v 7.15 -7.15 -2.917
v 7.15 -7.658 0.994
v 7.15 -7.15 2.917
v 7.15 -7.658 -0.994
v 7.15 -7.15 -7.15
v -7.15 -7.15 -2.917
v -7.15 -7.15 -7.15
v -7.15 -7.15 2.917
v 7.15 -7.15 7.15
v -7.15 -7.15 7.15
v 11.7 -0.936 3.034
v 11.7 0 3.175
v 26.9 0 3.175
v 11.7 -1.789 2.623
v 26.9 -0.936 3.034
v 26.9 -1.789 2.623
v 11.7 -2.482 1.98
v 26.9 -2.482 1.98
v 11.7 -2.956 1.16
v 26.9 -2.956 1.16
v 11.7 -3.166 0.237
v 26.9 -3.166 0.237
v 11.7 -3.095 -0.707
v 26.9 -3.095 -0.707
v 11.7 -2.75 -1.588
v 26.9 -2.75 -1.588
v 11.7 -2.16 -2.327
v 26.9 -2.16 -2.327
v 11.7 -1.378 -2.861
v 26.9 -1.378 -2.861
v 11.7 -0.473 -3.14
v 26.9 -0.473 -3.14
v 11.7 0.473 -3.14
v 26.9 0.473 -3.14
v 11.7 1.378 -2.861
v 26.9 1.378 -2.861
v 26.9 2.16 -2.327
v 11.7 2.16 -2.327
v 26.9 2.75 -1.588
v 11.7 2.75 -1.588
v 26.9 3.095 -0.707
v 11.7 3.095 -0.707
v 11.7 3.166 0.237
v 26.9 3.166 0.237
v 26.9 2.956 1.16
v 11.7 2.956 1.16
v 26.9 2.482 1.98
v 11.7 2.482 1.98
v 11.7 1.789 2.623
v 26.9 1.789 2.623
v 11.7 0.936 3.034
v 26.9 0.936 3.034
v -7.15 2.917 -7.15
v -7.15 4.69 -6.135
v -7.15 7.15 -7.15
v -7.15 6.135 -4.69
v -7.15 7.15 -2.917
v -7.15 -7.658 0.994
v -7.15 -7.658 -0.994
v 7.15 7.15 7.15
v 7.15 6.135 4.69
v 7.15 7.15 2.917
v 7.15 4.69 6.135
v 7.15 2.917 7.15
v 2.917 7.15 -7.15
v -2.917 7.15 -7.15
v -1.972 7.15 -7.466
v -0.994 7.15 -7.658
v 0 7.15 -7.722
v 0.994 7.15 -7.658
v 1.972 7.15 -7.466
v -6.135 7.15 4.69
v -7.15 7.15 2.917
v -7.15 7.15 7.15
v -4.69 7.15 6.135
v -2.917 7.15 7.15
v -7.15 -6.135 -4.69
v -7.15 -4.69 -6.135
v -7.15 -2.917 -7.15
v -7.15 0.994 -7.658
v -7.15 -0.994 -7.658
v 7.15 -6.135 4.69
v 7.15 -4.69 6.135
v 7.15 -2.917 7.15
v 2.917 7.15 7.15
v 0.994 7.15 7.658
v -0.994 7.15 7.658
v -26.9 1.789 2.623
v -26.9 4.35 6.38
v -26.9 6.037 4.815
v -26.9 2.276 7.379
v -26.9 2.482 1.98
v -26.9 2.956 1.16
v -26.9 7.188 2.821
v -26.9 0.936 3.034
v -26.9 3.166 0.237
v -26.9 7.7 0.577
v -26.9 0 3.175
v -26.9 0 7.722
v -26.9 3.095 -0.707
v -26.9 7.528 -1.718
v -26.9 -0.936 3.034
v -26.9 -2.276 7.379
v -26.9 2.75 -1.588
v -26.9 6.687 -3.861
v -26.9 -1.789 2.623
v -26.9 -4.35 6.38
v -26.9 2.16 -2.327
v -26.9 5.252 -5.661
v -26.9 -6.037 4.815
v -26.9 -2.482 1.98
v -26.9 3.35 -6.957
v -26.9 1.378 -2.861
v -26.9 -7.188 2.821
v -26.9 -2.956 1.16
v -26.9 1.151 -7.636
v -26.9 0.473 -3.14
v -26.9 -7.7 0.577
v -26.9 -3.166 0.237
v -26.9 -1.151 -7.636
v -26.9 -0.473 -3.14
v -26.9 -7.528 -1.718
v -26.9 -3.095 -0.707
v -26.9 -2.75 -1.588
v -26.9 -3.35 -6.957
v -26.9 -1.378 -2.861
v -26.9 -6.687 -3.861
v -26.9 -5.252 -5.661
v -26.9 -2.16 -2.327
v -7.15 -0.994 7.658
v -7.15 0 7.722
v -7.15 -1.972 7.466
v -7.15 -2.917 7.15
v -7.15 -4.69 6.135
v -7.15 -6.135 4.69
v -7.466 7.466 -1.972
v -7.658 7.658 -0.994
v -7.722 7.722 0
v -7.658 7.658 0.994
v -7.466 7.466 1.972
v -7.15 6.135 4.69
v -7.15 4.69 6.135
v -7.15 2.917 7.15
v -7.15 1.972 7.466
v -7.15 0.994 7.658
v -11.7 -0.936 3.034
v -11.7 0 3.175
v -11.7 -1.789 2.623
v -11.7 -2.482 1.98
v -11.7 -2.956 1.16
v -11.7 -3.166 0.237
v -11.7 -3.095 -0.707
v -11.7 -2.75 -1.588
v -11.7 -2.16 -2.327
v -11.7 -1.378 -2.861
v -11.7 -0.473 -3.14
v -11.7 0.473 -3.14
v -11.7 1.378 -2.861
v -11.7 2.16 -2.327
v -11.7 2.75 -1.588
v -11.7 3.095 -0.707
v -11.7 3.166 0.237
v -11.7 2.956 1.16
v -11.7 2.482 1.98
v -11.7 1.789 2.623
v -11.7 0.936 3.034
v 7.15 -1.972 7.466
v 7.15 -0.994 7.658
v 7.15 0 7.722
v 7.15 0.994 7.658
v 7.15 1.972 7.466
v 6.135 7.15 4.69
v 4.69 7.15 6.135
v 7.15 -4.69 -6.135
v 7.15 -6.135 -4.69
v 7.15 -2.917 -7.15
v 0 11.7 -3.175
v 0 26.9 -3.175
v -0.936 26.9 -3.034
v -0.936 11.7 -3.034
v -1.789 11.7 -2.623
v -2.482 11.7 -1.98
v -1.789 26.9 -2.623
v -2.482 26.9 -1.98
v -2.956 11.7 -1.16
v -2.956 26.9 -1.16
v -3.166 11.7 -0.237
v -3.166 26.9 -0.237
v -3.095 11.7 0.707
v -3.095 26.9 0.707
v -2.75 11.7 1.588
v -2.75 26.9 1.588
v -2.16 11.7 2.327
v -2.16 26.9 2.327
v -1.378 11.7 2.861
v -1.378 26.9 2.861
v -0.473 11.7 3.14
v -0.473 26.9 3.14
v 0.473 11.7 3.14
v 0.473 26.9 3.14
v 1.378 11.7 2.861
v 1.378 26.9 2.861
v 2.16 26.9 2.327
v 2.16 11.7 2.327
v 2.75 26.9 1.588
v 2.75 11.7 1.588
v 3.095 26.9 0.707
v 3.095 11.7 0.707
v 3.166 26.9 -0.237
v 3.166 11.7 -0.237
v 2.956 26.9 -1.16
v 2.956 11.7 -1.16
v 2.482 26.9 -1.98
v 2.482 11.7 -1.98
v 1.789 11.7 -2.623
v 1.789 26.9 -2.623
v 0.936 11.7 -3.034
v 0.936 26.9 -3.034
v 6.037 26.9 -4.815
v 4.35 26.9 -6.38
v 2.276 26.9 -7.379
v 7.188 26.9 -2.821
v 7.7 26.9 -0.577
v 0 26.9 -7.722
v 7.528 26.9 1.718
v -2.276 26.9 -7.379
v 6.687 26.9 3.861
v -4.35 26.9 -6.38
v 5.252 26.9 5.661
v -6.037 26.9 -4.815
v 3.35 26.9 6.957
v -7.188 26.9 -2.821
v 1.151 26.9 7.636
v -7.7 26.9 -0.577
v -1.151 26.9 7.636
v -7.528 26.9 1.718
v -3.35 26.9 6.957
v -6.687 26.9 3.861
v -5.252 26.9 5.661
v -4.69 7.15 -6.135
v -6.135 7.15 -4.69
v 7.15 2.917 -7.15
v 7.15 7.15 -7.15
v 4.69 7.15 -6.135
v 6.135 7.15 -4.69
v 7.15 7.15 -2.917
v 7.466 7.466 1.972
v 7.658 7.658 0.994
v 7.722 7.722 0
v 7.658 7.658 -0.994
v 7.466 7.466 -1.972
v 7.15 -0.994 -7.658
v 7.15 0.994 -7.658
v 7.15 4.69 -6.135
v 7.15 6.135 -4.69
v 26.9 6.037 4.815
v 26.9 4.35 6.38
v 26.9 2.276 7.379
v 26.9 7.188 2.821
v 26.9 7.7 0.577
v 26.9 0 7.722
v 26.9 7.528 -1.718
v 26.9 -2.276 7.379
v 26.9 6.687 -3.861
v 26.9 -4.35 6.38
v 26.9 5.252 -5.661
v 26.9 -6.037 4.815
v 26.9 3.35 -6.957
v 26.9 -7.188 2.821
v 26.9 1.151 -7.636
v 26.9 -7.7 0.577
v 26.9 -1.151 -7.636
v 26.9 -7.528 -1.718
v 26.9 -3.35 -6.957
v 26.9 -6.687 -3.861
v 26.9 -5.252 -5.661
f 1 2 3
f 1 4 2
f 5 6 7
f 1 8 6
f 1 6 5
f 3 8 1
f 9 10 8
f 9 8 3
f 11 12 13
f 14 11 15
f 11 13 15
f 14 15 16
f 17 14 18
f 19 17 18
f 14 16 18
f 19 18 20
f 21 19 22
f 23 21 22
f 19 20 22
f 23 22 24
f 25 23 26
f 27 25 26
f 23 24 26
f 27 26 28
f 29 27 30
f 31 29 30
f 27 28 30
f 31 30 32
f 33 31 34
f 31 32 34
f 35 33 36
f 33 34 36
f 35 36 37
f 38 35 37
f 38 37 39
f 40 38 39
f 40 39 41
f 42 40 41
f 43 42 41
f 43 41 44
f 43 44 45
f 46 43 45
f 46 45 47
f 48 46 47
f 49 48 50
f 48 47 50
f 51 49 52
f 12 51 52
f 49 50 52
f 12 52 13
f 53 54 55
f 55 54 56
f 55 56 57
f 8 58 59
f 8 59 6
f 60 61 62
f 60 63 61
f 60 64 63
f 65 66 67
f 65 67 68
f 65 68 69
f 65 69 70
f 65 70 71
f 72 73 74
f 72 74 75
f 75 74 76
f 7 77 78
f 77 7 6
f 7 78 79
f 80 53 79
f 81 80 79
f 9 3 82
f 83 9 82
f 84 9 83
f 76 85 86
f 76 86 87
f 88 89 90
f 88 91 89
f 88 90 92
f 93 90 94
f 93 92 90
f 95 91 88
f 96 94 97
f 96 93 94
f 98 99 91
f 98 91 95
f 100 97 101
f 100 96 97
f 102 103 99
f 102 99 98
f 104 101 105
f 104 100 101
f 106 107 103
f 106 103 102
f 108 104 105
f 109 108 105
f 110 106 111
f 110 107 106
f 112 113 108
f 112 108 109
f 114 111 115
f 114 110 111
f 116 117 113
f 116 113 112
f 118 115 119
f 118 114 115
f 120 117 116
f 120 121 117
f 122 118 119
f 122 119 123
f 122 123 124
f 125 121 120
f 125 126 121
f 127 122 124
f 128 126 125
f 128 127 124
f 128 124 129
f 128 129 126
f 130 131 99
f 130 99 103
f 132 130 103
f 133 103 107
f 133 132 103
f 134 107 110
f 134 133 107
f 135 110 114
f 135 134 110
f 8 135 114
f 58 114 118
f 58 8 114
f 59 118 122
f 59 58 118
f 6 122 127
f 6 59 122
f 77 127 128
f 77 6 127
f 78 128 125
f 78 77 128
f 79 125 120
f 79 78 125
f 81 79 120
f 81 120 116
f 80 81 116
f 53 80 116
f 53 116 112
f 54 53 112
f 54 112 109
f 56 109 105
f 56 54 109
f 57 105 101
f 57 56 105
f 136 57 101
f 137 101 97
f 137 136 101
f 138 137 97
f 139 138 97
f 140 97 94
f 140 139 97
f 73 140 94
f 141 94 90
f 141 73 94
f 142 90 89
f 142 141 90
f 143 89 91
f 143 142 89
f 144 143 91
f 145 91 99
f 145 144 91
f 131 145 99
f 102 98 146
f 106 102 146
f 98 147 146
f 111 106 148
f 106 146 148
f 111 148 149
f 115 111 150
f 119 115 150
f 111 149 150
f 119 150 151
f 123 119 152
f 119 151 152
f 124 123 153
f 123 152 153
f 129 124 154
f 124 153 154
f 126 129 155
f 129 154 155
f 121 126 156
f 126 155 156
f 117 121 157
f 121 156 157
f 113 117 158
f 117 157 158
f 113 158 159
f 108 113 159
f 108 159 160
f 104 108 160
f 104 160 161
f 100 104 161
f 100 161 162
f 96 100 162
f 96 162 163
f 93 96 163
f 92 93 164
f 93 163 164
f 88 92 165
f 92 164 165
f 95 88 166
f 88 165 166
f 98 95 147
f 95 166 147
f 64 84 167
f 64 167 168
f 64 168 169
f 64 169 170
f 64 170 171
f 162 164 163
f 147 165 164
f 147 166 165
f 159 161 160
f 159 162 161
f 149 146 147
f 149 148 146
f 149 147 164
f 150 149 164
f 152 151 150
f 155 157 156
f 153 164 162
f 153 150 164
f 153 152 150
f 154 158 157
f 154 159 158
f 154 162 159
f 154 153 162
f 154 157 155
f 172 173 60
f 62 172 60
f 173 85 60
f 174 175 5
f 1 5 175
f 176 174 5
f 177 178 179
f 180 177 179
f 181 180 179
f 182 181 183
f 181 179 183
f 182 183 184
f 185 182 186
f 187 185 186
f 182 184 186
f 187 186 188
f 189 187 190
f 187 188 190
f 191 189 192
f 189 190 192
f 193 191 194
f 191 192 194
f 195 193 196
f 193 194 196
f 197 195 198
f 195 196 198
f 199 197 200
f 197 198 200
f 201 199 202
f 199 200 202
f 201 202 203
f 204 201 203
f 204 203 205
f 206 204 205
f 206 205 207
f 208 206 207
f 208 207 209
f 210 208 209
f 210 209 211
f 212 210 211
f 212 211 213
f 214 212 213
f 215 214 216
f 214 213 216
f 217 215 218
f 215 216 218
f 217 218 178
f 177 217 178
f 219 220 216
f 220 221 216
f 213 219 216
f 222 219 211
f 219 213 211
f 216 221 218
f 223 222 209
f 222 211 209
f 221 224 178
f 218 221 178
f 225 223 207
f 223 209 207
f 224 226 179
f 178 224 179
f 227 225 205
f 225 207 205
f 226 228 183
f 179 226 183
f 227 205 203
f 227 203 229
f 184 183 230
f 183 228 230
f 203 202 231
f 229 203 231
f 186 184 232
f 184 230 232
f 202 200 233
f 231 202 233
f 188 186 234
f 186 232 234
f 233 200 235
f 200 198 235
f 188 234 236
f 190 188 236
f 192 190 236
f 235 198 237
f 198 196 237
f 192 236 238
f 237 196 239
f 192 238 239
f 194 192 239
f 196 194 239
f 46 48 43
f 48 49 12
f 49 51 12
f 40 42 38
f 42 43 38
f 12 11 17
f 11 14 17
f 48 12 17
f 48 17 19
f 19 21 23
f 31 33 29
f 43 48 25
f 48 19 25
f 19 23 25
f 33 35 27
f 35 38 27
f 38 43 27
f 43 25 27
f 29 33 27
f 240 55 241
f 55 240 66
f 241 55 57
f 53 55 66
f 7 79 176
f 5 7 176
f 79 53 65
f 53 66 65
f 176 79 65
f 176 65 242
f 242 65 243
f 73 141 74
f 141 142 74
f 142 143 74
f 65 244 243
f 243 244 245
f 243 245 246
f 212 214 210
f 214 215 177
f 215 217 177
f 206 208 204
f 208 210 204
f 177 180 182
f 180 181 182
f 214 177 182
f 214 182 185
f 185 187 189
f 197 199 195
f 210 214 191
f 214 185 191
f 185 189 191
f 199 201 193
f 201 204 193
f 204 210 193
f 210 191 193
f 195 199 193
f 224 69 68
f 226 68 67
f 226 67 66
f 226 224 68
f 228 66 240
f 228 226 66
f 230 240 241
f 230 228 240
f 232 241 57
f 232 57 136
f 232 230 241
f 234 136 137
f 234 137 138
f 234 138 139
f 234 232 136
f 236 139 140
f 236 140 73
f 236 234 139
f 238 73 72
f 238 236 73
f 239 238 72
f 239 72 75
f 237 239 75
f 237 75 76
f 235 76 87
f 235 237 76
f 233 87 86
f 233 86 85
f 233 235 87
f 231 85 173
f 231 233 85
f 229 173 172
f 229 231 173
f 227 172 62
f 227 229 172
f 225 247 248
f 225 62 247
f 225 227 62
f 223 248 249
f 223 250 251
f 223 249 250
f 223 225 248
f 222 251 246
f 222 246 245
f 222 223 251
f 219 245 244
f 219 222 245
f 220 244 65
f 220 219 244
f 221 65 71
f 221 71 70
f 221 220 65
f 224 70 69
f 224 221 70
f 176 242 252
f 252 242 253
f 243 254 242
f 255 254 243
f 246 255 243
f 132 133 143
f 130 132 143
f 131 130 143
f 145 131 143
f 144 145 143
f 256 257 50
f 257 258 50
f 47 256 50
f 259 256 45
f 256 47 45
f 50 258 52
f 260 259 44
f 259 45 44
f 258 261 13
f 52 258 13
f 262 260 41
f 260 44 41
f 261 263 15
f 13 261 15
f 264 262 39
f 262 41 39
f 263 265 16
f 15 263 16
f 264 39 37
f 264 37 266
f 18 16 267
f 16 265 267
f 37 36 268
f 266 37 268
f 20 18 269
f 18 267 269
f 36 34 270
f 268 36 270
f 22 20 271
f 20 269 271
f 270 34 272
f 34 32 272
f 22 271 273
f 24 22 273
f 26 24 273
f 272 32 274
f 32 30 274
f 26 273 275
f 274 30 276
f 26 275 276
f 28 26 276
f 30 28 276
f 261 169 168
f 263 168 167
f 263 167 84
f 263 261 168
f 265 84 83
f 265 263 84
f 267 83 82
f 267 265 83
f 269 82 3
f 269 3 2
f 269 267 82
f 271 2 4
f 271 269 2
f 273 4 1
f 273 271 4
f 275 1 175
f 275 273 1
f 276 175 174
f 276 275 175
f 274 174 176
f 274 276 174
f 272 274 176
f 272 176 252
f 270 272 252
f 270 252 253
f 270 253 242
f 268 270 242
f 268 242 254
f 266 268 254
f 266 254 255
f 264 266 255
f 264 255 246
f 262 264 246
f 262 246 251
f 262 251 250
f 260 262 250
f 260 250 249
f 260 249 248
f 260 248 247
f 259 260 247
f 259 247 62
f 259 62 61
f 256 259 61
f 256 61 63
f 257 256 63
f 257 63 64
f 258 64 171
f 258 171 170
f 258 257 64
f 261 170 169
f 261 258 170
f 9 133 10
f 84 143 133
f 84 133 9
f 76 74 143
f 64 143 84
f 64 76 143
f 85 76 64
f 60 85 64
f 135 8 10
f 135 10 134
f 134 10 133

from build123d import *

# Parameters (mm, degrees)
BLOCK_SKETCH_W      = 14.3
BLOCK_SKETCH_H      = 14.3
BLOCK_DEPTH         = 7.15
ARM_X_SKETCH_W      = 19.75
ARM_X_SKETCH_H      = 7.722
ARM_Y_SKETCH_W      = 7.722
ARM_Y_SKETCH_H      = 19.75
SOCKET_X_SKETCH_W   = 16.2
SOCKET_X_SKETCH_H   = 3.175
SOCKET_Y_SKETCH_W   = 3.175
SOCKET_Y_SKETCH_H   = 16.2
ARM_X_SKETCH_2_W    = 19.75
ARM_X_SKETCH_2_H    = 7.722
SOCKET_X_SKETCH_2_W = 16.2
SOCKET_X_SKETCH_2_H = 3.175


with BuildPart() as part:
    # Block Sketch → Block (new, symmetric)
    with BuildSketch(Plane.XY):
        Rectangle(BLOCK_SKETCH_W, BLOCK_SKETCH_H)
    extrude(amount=BLOCK_DEPTH, both=True)

    # Arm X Sketch → Arm X (revolve)
    with BuildSketch(Plane.XY):
        with Locations((17.025, 3.861)):
            Rectangle(ARM_X_SKETCH_W, ARM_X_SKETCH_H)
    revolve(axis=Axis((-1000, 0, 0), (1, 0, 0)))

    # Arm Y Sketch → Arm Y (revolve)
    with BuildSketch(Plane.XY):
        with Locations((3.861, 17.025)):
            Rectangle(ARM_Y_SKETCH_W, ARM_Y_SKETCH_H)
    revolve(axis=Axis((0, -500, 0), (0, 1, 0)))

    # Socket X Sketch → Socket X (revolve, cut)
    with BuildSketch(Plane.XY):
        with Locations((19.8, 1.5875)):
            Rectangle(SOCKET_X_SKETCH_W, SOCKET_X_SKETCH_H)
    revolve(axis=Axis((-1000, 0, 0), (1, 0, 0)), mode=Mode.SUBTRACT)

    # Socket Y Sketch → Socket Y (revolve, cut)
    with BuildSketch(Plane.XY):
        with Locations((1.5875, 19.8)):
            Rectangle(SOCKET_Y_SKETCH_W, SOCKET_Y_SKETCH_H)
    revolve(axis=Axis((0, -500, 0), (0, 1, 0)), mode=Mode.SUBTRACT)

    # Arm -X Sketch 2 → Arm -X 2 (revolve)
    with BuildSketch(Plane.XY):
        with Locations((-17.025, 3.861)):
            Rectangle(ARM_X_SKETCH_2_W, ARM_X_SKETCH_2_H)
    revolve(axis=Axis((-1000, 0, 0), (1, 0, 0)))

    # Socket -X Sketch 2 → Socket -X 2 (revolve, cut)
    with BuildSketch(Plane.XY):
        with Locations((-19.8, 1.5875)):
            Rectangle(SOCKET_X_SKETCH_2_W, SOCKET_X_SKETCH_2_H)
    revolve(axis=Axis((-1000, 0, 0), (1, 0, 0)), mode=Mode.SUBTRACT)


solid = part.part
